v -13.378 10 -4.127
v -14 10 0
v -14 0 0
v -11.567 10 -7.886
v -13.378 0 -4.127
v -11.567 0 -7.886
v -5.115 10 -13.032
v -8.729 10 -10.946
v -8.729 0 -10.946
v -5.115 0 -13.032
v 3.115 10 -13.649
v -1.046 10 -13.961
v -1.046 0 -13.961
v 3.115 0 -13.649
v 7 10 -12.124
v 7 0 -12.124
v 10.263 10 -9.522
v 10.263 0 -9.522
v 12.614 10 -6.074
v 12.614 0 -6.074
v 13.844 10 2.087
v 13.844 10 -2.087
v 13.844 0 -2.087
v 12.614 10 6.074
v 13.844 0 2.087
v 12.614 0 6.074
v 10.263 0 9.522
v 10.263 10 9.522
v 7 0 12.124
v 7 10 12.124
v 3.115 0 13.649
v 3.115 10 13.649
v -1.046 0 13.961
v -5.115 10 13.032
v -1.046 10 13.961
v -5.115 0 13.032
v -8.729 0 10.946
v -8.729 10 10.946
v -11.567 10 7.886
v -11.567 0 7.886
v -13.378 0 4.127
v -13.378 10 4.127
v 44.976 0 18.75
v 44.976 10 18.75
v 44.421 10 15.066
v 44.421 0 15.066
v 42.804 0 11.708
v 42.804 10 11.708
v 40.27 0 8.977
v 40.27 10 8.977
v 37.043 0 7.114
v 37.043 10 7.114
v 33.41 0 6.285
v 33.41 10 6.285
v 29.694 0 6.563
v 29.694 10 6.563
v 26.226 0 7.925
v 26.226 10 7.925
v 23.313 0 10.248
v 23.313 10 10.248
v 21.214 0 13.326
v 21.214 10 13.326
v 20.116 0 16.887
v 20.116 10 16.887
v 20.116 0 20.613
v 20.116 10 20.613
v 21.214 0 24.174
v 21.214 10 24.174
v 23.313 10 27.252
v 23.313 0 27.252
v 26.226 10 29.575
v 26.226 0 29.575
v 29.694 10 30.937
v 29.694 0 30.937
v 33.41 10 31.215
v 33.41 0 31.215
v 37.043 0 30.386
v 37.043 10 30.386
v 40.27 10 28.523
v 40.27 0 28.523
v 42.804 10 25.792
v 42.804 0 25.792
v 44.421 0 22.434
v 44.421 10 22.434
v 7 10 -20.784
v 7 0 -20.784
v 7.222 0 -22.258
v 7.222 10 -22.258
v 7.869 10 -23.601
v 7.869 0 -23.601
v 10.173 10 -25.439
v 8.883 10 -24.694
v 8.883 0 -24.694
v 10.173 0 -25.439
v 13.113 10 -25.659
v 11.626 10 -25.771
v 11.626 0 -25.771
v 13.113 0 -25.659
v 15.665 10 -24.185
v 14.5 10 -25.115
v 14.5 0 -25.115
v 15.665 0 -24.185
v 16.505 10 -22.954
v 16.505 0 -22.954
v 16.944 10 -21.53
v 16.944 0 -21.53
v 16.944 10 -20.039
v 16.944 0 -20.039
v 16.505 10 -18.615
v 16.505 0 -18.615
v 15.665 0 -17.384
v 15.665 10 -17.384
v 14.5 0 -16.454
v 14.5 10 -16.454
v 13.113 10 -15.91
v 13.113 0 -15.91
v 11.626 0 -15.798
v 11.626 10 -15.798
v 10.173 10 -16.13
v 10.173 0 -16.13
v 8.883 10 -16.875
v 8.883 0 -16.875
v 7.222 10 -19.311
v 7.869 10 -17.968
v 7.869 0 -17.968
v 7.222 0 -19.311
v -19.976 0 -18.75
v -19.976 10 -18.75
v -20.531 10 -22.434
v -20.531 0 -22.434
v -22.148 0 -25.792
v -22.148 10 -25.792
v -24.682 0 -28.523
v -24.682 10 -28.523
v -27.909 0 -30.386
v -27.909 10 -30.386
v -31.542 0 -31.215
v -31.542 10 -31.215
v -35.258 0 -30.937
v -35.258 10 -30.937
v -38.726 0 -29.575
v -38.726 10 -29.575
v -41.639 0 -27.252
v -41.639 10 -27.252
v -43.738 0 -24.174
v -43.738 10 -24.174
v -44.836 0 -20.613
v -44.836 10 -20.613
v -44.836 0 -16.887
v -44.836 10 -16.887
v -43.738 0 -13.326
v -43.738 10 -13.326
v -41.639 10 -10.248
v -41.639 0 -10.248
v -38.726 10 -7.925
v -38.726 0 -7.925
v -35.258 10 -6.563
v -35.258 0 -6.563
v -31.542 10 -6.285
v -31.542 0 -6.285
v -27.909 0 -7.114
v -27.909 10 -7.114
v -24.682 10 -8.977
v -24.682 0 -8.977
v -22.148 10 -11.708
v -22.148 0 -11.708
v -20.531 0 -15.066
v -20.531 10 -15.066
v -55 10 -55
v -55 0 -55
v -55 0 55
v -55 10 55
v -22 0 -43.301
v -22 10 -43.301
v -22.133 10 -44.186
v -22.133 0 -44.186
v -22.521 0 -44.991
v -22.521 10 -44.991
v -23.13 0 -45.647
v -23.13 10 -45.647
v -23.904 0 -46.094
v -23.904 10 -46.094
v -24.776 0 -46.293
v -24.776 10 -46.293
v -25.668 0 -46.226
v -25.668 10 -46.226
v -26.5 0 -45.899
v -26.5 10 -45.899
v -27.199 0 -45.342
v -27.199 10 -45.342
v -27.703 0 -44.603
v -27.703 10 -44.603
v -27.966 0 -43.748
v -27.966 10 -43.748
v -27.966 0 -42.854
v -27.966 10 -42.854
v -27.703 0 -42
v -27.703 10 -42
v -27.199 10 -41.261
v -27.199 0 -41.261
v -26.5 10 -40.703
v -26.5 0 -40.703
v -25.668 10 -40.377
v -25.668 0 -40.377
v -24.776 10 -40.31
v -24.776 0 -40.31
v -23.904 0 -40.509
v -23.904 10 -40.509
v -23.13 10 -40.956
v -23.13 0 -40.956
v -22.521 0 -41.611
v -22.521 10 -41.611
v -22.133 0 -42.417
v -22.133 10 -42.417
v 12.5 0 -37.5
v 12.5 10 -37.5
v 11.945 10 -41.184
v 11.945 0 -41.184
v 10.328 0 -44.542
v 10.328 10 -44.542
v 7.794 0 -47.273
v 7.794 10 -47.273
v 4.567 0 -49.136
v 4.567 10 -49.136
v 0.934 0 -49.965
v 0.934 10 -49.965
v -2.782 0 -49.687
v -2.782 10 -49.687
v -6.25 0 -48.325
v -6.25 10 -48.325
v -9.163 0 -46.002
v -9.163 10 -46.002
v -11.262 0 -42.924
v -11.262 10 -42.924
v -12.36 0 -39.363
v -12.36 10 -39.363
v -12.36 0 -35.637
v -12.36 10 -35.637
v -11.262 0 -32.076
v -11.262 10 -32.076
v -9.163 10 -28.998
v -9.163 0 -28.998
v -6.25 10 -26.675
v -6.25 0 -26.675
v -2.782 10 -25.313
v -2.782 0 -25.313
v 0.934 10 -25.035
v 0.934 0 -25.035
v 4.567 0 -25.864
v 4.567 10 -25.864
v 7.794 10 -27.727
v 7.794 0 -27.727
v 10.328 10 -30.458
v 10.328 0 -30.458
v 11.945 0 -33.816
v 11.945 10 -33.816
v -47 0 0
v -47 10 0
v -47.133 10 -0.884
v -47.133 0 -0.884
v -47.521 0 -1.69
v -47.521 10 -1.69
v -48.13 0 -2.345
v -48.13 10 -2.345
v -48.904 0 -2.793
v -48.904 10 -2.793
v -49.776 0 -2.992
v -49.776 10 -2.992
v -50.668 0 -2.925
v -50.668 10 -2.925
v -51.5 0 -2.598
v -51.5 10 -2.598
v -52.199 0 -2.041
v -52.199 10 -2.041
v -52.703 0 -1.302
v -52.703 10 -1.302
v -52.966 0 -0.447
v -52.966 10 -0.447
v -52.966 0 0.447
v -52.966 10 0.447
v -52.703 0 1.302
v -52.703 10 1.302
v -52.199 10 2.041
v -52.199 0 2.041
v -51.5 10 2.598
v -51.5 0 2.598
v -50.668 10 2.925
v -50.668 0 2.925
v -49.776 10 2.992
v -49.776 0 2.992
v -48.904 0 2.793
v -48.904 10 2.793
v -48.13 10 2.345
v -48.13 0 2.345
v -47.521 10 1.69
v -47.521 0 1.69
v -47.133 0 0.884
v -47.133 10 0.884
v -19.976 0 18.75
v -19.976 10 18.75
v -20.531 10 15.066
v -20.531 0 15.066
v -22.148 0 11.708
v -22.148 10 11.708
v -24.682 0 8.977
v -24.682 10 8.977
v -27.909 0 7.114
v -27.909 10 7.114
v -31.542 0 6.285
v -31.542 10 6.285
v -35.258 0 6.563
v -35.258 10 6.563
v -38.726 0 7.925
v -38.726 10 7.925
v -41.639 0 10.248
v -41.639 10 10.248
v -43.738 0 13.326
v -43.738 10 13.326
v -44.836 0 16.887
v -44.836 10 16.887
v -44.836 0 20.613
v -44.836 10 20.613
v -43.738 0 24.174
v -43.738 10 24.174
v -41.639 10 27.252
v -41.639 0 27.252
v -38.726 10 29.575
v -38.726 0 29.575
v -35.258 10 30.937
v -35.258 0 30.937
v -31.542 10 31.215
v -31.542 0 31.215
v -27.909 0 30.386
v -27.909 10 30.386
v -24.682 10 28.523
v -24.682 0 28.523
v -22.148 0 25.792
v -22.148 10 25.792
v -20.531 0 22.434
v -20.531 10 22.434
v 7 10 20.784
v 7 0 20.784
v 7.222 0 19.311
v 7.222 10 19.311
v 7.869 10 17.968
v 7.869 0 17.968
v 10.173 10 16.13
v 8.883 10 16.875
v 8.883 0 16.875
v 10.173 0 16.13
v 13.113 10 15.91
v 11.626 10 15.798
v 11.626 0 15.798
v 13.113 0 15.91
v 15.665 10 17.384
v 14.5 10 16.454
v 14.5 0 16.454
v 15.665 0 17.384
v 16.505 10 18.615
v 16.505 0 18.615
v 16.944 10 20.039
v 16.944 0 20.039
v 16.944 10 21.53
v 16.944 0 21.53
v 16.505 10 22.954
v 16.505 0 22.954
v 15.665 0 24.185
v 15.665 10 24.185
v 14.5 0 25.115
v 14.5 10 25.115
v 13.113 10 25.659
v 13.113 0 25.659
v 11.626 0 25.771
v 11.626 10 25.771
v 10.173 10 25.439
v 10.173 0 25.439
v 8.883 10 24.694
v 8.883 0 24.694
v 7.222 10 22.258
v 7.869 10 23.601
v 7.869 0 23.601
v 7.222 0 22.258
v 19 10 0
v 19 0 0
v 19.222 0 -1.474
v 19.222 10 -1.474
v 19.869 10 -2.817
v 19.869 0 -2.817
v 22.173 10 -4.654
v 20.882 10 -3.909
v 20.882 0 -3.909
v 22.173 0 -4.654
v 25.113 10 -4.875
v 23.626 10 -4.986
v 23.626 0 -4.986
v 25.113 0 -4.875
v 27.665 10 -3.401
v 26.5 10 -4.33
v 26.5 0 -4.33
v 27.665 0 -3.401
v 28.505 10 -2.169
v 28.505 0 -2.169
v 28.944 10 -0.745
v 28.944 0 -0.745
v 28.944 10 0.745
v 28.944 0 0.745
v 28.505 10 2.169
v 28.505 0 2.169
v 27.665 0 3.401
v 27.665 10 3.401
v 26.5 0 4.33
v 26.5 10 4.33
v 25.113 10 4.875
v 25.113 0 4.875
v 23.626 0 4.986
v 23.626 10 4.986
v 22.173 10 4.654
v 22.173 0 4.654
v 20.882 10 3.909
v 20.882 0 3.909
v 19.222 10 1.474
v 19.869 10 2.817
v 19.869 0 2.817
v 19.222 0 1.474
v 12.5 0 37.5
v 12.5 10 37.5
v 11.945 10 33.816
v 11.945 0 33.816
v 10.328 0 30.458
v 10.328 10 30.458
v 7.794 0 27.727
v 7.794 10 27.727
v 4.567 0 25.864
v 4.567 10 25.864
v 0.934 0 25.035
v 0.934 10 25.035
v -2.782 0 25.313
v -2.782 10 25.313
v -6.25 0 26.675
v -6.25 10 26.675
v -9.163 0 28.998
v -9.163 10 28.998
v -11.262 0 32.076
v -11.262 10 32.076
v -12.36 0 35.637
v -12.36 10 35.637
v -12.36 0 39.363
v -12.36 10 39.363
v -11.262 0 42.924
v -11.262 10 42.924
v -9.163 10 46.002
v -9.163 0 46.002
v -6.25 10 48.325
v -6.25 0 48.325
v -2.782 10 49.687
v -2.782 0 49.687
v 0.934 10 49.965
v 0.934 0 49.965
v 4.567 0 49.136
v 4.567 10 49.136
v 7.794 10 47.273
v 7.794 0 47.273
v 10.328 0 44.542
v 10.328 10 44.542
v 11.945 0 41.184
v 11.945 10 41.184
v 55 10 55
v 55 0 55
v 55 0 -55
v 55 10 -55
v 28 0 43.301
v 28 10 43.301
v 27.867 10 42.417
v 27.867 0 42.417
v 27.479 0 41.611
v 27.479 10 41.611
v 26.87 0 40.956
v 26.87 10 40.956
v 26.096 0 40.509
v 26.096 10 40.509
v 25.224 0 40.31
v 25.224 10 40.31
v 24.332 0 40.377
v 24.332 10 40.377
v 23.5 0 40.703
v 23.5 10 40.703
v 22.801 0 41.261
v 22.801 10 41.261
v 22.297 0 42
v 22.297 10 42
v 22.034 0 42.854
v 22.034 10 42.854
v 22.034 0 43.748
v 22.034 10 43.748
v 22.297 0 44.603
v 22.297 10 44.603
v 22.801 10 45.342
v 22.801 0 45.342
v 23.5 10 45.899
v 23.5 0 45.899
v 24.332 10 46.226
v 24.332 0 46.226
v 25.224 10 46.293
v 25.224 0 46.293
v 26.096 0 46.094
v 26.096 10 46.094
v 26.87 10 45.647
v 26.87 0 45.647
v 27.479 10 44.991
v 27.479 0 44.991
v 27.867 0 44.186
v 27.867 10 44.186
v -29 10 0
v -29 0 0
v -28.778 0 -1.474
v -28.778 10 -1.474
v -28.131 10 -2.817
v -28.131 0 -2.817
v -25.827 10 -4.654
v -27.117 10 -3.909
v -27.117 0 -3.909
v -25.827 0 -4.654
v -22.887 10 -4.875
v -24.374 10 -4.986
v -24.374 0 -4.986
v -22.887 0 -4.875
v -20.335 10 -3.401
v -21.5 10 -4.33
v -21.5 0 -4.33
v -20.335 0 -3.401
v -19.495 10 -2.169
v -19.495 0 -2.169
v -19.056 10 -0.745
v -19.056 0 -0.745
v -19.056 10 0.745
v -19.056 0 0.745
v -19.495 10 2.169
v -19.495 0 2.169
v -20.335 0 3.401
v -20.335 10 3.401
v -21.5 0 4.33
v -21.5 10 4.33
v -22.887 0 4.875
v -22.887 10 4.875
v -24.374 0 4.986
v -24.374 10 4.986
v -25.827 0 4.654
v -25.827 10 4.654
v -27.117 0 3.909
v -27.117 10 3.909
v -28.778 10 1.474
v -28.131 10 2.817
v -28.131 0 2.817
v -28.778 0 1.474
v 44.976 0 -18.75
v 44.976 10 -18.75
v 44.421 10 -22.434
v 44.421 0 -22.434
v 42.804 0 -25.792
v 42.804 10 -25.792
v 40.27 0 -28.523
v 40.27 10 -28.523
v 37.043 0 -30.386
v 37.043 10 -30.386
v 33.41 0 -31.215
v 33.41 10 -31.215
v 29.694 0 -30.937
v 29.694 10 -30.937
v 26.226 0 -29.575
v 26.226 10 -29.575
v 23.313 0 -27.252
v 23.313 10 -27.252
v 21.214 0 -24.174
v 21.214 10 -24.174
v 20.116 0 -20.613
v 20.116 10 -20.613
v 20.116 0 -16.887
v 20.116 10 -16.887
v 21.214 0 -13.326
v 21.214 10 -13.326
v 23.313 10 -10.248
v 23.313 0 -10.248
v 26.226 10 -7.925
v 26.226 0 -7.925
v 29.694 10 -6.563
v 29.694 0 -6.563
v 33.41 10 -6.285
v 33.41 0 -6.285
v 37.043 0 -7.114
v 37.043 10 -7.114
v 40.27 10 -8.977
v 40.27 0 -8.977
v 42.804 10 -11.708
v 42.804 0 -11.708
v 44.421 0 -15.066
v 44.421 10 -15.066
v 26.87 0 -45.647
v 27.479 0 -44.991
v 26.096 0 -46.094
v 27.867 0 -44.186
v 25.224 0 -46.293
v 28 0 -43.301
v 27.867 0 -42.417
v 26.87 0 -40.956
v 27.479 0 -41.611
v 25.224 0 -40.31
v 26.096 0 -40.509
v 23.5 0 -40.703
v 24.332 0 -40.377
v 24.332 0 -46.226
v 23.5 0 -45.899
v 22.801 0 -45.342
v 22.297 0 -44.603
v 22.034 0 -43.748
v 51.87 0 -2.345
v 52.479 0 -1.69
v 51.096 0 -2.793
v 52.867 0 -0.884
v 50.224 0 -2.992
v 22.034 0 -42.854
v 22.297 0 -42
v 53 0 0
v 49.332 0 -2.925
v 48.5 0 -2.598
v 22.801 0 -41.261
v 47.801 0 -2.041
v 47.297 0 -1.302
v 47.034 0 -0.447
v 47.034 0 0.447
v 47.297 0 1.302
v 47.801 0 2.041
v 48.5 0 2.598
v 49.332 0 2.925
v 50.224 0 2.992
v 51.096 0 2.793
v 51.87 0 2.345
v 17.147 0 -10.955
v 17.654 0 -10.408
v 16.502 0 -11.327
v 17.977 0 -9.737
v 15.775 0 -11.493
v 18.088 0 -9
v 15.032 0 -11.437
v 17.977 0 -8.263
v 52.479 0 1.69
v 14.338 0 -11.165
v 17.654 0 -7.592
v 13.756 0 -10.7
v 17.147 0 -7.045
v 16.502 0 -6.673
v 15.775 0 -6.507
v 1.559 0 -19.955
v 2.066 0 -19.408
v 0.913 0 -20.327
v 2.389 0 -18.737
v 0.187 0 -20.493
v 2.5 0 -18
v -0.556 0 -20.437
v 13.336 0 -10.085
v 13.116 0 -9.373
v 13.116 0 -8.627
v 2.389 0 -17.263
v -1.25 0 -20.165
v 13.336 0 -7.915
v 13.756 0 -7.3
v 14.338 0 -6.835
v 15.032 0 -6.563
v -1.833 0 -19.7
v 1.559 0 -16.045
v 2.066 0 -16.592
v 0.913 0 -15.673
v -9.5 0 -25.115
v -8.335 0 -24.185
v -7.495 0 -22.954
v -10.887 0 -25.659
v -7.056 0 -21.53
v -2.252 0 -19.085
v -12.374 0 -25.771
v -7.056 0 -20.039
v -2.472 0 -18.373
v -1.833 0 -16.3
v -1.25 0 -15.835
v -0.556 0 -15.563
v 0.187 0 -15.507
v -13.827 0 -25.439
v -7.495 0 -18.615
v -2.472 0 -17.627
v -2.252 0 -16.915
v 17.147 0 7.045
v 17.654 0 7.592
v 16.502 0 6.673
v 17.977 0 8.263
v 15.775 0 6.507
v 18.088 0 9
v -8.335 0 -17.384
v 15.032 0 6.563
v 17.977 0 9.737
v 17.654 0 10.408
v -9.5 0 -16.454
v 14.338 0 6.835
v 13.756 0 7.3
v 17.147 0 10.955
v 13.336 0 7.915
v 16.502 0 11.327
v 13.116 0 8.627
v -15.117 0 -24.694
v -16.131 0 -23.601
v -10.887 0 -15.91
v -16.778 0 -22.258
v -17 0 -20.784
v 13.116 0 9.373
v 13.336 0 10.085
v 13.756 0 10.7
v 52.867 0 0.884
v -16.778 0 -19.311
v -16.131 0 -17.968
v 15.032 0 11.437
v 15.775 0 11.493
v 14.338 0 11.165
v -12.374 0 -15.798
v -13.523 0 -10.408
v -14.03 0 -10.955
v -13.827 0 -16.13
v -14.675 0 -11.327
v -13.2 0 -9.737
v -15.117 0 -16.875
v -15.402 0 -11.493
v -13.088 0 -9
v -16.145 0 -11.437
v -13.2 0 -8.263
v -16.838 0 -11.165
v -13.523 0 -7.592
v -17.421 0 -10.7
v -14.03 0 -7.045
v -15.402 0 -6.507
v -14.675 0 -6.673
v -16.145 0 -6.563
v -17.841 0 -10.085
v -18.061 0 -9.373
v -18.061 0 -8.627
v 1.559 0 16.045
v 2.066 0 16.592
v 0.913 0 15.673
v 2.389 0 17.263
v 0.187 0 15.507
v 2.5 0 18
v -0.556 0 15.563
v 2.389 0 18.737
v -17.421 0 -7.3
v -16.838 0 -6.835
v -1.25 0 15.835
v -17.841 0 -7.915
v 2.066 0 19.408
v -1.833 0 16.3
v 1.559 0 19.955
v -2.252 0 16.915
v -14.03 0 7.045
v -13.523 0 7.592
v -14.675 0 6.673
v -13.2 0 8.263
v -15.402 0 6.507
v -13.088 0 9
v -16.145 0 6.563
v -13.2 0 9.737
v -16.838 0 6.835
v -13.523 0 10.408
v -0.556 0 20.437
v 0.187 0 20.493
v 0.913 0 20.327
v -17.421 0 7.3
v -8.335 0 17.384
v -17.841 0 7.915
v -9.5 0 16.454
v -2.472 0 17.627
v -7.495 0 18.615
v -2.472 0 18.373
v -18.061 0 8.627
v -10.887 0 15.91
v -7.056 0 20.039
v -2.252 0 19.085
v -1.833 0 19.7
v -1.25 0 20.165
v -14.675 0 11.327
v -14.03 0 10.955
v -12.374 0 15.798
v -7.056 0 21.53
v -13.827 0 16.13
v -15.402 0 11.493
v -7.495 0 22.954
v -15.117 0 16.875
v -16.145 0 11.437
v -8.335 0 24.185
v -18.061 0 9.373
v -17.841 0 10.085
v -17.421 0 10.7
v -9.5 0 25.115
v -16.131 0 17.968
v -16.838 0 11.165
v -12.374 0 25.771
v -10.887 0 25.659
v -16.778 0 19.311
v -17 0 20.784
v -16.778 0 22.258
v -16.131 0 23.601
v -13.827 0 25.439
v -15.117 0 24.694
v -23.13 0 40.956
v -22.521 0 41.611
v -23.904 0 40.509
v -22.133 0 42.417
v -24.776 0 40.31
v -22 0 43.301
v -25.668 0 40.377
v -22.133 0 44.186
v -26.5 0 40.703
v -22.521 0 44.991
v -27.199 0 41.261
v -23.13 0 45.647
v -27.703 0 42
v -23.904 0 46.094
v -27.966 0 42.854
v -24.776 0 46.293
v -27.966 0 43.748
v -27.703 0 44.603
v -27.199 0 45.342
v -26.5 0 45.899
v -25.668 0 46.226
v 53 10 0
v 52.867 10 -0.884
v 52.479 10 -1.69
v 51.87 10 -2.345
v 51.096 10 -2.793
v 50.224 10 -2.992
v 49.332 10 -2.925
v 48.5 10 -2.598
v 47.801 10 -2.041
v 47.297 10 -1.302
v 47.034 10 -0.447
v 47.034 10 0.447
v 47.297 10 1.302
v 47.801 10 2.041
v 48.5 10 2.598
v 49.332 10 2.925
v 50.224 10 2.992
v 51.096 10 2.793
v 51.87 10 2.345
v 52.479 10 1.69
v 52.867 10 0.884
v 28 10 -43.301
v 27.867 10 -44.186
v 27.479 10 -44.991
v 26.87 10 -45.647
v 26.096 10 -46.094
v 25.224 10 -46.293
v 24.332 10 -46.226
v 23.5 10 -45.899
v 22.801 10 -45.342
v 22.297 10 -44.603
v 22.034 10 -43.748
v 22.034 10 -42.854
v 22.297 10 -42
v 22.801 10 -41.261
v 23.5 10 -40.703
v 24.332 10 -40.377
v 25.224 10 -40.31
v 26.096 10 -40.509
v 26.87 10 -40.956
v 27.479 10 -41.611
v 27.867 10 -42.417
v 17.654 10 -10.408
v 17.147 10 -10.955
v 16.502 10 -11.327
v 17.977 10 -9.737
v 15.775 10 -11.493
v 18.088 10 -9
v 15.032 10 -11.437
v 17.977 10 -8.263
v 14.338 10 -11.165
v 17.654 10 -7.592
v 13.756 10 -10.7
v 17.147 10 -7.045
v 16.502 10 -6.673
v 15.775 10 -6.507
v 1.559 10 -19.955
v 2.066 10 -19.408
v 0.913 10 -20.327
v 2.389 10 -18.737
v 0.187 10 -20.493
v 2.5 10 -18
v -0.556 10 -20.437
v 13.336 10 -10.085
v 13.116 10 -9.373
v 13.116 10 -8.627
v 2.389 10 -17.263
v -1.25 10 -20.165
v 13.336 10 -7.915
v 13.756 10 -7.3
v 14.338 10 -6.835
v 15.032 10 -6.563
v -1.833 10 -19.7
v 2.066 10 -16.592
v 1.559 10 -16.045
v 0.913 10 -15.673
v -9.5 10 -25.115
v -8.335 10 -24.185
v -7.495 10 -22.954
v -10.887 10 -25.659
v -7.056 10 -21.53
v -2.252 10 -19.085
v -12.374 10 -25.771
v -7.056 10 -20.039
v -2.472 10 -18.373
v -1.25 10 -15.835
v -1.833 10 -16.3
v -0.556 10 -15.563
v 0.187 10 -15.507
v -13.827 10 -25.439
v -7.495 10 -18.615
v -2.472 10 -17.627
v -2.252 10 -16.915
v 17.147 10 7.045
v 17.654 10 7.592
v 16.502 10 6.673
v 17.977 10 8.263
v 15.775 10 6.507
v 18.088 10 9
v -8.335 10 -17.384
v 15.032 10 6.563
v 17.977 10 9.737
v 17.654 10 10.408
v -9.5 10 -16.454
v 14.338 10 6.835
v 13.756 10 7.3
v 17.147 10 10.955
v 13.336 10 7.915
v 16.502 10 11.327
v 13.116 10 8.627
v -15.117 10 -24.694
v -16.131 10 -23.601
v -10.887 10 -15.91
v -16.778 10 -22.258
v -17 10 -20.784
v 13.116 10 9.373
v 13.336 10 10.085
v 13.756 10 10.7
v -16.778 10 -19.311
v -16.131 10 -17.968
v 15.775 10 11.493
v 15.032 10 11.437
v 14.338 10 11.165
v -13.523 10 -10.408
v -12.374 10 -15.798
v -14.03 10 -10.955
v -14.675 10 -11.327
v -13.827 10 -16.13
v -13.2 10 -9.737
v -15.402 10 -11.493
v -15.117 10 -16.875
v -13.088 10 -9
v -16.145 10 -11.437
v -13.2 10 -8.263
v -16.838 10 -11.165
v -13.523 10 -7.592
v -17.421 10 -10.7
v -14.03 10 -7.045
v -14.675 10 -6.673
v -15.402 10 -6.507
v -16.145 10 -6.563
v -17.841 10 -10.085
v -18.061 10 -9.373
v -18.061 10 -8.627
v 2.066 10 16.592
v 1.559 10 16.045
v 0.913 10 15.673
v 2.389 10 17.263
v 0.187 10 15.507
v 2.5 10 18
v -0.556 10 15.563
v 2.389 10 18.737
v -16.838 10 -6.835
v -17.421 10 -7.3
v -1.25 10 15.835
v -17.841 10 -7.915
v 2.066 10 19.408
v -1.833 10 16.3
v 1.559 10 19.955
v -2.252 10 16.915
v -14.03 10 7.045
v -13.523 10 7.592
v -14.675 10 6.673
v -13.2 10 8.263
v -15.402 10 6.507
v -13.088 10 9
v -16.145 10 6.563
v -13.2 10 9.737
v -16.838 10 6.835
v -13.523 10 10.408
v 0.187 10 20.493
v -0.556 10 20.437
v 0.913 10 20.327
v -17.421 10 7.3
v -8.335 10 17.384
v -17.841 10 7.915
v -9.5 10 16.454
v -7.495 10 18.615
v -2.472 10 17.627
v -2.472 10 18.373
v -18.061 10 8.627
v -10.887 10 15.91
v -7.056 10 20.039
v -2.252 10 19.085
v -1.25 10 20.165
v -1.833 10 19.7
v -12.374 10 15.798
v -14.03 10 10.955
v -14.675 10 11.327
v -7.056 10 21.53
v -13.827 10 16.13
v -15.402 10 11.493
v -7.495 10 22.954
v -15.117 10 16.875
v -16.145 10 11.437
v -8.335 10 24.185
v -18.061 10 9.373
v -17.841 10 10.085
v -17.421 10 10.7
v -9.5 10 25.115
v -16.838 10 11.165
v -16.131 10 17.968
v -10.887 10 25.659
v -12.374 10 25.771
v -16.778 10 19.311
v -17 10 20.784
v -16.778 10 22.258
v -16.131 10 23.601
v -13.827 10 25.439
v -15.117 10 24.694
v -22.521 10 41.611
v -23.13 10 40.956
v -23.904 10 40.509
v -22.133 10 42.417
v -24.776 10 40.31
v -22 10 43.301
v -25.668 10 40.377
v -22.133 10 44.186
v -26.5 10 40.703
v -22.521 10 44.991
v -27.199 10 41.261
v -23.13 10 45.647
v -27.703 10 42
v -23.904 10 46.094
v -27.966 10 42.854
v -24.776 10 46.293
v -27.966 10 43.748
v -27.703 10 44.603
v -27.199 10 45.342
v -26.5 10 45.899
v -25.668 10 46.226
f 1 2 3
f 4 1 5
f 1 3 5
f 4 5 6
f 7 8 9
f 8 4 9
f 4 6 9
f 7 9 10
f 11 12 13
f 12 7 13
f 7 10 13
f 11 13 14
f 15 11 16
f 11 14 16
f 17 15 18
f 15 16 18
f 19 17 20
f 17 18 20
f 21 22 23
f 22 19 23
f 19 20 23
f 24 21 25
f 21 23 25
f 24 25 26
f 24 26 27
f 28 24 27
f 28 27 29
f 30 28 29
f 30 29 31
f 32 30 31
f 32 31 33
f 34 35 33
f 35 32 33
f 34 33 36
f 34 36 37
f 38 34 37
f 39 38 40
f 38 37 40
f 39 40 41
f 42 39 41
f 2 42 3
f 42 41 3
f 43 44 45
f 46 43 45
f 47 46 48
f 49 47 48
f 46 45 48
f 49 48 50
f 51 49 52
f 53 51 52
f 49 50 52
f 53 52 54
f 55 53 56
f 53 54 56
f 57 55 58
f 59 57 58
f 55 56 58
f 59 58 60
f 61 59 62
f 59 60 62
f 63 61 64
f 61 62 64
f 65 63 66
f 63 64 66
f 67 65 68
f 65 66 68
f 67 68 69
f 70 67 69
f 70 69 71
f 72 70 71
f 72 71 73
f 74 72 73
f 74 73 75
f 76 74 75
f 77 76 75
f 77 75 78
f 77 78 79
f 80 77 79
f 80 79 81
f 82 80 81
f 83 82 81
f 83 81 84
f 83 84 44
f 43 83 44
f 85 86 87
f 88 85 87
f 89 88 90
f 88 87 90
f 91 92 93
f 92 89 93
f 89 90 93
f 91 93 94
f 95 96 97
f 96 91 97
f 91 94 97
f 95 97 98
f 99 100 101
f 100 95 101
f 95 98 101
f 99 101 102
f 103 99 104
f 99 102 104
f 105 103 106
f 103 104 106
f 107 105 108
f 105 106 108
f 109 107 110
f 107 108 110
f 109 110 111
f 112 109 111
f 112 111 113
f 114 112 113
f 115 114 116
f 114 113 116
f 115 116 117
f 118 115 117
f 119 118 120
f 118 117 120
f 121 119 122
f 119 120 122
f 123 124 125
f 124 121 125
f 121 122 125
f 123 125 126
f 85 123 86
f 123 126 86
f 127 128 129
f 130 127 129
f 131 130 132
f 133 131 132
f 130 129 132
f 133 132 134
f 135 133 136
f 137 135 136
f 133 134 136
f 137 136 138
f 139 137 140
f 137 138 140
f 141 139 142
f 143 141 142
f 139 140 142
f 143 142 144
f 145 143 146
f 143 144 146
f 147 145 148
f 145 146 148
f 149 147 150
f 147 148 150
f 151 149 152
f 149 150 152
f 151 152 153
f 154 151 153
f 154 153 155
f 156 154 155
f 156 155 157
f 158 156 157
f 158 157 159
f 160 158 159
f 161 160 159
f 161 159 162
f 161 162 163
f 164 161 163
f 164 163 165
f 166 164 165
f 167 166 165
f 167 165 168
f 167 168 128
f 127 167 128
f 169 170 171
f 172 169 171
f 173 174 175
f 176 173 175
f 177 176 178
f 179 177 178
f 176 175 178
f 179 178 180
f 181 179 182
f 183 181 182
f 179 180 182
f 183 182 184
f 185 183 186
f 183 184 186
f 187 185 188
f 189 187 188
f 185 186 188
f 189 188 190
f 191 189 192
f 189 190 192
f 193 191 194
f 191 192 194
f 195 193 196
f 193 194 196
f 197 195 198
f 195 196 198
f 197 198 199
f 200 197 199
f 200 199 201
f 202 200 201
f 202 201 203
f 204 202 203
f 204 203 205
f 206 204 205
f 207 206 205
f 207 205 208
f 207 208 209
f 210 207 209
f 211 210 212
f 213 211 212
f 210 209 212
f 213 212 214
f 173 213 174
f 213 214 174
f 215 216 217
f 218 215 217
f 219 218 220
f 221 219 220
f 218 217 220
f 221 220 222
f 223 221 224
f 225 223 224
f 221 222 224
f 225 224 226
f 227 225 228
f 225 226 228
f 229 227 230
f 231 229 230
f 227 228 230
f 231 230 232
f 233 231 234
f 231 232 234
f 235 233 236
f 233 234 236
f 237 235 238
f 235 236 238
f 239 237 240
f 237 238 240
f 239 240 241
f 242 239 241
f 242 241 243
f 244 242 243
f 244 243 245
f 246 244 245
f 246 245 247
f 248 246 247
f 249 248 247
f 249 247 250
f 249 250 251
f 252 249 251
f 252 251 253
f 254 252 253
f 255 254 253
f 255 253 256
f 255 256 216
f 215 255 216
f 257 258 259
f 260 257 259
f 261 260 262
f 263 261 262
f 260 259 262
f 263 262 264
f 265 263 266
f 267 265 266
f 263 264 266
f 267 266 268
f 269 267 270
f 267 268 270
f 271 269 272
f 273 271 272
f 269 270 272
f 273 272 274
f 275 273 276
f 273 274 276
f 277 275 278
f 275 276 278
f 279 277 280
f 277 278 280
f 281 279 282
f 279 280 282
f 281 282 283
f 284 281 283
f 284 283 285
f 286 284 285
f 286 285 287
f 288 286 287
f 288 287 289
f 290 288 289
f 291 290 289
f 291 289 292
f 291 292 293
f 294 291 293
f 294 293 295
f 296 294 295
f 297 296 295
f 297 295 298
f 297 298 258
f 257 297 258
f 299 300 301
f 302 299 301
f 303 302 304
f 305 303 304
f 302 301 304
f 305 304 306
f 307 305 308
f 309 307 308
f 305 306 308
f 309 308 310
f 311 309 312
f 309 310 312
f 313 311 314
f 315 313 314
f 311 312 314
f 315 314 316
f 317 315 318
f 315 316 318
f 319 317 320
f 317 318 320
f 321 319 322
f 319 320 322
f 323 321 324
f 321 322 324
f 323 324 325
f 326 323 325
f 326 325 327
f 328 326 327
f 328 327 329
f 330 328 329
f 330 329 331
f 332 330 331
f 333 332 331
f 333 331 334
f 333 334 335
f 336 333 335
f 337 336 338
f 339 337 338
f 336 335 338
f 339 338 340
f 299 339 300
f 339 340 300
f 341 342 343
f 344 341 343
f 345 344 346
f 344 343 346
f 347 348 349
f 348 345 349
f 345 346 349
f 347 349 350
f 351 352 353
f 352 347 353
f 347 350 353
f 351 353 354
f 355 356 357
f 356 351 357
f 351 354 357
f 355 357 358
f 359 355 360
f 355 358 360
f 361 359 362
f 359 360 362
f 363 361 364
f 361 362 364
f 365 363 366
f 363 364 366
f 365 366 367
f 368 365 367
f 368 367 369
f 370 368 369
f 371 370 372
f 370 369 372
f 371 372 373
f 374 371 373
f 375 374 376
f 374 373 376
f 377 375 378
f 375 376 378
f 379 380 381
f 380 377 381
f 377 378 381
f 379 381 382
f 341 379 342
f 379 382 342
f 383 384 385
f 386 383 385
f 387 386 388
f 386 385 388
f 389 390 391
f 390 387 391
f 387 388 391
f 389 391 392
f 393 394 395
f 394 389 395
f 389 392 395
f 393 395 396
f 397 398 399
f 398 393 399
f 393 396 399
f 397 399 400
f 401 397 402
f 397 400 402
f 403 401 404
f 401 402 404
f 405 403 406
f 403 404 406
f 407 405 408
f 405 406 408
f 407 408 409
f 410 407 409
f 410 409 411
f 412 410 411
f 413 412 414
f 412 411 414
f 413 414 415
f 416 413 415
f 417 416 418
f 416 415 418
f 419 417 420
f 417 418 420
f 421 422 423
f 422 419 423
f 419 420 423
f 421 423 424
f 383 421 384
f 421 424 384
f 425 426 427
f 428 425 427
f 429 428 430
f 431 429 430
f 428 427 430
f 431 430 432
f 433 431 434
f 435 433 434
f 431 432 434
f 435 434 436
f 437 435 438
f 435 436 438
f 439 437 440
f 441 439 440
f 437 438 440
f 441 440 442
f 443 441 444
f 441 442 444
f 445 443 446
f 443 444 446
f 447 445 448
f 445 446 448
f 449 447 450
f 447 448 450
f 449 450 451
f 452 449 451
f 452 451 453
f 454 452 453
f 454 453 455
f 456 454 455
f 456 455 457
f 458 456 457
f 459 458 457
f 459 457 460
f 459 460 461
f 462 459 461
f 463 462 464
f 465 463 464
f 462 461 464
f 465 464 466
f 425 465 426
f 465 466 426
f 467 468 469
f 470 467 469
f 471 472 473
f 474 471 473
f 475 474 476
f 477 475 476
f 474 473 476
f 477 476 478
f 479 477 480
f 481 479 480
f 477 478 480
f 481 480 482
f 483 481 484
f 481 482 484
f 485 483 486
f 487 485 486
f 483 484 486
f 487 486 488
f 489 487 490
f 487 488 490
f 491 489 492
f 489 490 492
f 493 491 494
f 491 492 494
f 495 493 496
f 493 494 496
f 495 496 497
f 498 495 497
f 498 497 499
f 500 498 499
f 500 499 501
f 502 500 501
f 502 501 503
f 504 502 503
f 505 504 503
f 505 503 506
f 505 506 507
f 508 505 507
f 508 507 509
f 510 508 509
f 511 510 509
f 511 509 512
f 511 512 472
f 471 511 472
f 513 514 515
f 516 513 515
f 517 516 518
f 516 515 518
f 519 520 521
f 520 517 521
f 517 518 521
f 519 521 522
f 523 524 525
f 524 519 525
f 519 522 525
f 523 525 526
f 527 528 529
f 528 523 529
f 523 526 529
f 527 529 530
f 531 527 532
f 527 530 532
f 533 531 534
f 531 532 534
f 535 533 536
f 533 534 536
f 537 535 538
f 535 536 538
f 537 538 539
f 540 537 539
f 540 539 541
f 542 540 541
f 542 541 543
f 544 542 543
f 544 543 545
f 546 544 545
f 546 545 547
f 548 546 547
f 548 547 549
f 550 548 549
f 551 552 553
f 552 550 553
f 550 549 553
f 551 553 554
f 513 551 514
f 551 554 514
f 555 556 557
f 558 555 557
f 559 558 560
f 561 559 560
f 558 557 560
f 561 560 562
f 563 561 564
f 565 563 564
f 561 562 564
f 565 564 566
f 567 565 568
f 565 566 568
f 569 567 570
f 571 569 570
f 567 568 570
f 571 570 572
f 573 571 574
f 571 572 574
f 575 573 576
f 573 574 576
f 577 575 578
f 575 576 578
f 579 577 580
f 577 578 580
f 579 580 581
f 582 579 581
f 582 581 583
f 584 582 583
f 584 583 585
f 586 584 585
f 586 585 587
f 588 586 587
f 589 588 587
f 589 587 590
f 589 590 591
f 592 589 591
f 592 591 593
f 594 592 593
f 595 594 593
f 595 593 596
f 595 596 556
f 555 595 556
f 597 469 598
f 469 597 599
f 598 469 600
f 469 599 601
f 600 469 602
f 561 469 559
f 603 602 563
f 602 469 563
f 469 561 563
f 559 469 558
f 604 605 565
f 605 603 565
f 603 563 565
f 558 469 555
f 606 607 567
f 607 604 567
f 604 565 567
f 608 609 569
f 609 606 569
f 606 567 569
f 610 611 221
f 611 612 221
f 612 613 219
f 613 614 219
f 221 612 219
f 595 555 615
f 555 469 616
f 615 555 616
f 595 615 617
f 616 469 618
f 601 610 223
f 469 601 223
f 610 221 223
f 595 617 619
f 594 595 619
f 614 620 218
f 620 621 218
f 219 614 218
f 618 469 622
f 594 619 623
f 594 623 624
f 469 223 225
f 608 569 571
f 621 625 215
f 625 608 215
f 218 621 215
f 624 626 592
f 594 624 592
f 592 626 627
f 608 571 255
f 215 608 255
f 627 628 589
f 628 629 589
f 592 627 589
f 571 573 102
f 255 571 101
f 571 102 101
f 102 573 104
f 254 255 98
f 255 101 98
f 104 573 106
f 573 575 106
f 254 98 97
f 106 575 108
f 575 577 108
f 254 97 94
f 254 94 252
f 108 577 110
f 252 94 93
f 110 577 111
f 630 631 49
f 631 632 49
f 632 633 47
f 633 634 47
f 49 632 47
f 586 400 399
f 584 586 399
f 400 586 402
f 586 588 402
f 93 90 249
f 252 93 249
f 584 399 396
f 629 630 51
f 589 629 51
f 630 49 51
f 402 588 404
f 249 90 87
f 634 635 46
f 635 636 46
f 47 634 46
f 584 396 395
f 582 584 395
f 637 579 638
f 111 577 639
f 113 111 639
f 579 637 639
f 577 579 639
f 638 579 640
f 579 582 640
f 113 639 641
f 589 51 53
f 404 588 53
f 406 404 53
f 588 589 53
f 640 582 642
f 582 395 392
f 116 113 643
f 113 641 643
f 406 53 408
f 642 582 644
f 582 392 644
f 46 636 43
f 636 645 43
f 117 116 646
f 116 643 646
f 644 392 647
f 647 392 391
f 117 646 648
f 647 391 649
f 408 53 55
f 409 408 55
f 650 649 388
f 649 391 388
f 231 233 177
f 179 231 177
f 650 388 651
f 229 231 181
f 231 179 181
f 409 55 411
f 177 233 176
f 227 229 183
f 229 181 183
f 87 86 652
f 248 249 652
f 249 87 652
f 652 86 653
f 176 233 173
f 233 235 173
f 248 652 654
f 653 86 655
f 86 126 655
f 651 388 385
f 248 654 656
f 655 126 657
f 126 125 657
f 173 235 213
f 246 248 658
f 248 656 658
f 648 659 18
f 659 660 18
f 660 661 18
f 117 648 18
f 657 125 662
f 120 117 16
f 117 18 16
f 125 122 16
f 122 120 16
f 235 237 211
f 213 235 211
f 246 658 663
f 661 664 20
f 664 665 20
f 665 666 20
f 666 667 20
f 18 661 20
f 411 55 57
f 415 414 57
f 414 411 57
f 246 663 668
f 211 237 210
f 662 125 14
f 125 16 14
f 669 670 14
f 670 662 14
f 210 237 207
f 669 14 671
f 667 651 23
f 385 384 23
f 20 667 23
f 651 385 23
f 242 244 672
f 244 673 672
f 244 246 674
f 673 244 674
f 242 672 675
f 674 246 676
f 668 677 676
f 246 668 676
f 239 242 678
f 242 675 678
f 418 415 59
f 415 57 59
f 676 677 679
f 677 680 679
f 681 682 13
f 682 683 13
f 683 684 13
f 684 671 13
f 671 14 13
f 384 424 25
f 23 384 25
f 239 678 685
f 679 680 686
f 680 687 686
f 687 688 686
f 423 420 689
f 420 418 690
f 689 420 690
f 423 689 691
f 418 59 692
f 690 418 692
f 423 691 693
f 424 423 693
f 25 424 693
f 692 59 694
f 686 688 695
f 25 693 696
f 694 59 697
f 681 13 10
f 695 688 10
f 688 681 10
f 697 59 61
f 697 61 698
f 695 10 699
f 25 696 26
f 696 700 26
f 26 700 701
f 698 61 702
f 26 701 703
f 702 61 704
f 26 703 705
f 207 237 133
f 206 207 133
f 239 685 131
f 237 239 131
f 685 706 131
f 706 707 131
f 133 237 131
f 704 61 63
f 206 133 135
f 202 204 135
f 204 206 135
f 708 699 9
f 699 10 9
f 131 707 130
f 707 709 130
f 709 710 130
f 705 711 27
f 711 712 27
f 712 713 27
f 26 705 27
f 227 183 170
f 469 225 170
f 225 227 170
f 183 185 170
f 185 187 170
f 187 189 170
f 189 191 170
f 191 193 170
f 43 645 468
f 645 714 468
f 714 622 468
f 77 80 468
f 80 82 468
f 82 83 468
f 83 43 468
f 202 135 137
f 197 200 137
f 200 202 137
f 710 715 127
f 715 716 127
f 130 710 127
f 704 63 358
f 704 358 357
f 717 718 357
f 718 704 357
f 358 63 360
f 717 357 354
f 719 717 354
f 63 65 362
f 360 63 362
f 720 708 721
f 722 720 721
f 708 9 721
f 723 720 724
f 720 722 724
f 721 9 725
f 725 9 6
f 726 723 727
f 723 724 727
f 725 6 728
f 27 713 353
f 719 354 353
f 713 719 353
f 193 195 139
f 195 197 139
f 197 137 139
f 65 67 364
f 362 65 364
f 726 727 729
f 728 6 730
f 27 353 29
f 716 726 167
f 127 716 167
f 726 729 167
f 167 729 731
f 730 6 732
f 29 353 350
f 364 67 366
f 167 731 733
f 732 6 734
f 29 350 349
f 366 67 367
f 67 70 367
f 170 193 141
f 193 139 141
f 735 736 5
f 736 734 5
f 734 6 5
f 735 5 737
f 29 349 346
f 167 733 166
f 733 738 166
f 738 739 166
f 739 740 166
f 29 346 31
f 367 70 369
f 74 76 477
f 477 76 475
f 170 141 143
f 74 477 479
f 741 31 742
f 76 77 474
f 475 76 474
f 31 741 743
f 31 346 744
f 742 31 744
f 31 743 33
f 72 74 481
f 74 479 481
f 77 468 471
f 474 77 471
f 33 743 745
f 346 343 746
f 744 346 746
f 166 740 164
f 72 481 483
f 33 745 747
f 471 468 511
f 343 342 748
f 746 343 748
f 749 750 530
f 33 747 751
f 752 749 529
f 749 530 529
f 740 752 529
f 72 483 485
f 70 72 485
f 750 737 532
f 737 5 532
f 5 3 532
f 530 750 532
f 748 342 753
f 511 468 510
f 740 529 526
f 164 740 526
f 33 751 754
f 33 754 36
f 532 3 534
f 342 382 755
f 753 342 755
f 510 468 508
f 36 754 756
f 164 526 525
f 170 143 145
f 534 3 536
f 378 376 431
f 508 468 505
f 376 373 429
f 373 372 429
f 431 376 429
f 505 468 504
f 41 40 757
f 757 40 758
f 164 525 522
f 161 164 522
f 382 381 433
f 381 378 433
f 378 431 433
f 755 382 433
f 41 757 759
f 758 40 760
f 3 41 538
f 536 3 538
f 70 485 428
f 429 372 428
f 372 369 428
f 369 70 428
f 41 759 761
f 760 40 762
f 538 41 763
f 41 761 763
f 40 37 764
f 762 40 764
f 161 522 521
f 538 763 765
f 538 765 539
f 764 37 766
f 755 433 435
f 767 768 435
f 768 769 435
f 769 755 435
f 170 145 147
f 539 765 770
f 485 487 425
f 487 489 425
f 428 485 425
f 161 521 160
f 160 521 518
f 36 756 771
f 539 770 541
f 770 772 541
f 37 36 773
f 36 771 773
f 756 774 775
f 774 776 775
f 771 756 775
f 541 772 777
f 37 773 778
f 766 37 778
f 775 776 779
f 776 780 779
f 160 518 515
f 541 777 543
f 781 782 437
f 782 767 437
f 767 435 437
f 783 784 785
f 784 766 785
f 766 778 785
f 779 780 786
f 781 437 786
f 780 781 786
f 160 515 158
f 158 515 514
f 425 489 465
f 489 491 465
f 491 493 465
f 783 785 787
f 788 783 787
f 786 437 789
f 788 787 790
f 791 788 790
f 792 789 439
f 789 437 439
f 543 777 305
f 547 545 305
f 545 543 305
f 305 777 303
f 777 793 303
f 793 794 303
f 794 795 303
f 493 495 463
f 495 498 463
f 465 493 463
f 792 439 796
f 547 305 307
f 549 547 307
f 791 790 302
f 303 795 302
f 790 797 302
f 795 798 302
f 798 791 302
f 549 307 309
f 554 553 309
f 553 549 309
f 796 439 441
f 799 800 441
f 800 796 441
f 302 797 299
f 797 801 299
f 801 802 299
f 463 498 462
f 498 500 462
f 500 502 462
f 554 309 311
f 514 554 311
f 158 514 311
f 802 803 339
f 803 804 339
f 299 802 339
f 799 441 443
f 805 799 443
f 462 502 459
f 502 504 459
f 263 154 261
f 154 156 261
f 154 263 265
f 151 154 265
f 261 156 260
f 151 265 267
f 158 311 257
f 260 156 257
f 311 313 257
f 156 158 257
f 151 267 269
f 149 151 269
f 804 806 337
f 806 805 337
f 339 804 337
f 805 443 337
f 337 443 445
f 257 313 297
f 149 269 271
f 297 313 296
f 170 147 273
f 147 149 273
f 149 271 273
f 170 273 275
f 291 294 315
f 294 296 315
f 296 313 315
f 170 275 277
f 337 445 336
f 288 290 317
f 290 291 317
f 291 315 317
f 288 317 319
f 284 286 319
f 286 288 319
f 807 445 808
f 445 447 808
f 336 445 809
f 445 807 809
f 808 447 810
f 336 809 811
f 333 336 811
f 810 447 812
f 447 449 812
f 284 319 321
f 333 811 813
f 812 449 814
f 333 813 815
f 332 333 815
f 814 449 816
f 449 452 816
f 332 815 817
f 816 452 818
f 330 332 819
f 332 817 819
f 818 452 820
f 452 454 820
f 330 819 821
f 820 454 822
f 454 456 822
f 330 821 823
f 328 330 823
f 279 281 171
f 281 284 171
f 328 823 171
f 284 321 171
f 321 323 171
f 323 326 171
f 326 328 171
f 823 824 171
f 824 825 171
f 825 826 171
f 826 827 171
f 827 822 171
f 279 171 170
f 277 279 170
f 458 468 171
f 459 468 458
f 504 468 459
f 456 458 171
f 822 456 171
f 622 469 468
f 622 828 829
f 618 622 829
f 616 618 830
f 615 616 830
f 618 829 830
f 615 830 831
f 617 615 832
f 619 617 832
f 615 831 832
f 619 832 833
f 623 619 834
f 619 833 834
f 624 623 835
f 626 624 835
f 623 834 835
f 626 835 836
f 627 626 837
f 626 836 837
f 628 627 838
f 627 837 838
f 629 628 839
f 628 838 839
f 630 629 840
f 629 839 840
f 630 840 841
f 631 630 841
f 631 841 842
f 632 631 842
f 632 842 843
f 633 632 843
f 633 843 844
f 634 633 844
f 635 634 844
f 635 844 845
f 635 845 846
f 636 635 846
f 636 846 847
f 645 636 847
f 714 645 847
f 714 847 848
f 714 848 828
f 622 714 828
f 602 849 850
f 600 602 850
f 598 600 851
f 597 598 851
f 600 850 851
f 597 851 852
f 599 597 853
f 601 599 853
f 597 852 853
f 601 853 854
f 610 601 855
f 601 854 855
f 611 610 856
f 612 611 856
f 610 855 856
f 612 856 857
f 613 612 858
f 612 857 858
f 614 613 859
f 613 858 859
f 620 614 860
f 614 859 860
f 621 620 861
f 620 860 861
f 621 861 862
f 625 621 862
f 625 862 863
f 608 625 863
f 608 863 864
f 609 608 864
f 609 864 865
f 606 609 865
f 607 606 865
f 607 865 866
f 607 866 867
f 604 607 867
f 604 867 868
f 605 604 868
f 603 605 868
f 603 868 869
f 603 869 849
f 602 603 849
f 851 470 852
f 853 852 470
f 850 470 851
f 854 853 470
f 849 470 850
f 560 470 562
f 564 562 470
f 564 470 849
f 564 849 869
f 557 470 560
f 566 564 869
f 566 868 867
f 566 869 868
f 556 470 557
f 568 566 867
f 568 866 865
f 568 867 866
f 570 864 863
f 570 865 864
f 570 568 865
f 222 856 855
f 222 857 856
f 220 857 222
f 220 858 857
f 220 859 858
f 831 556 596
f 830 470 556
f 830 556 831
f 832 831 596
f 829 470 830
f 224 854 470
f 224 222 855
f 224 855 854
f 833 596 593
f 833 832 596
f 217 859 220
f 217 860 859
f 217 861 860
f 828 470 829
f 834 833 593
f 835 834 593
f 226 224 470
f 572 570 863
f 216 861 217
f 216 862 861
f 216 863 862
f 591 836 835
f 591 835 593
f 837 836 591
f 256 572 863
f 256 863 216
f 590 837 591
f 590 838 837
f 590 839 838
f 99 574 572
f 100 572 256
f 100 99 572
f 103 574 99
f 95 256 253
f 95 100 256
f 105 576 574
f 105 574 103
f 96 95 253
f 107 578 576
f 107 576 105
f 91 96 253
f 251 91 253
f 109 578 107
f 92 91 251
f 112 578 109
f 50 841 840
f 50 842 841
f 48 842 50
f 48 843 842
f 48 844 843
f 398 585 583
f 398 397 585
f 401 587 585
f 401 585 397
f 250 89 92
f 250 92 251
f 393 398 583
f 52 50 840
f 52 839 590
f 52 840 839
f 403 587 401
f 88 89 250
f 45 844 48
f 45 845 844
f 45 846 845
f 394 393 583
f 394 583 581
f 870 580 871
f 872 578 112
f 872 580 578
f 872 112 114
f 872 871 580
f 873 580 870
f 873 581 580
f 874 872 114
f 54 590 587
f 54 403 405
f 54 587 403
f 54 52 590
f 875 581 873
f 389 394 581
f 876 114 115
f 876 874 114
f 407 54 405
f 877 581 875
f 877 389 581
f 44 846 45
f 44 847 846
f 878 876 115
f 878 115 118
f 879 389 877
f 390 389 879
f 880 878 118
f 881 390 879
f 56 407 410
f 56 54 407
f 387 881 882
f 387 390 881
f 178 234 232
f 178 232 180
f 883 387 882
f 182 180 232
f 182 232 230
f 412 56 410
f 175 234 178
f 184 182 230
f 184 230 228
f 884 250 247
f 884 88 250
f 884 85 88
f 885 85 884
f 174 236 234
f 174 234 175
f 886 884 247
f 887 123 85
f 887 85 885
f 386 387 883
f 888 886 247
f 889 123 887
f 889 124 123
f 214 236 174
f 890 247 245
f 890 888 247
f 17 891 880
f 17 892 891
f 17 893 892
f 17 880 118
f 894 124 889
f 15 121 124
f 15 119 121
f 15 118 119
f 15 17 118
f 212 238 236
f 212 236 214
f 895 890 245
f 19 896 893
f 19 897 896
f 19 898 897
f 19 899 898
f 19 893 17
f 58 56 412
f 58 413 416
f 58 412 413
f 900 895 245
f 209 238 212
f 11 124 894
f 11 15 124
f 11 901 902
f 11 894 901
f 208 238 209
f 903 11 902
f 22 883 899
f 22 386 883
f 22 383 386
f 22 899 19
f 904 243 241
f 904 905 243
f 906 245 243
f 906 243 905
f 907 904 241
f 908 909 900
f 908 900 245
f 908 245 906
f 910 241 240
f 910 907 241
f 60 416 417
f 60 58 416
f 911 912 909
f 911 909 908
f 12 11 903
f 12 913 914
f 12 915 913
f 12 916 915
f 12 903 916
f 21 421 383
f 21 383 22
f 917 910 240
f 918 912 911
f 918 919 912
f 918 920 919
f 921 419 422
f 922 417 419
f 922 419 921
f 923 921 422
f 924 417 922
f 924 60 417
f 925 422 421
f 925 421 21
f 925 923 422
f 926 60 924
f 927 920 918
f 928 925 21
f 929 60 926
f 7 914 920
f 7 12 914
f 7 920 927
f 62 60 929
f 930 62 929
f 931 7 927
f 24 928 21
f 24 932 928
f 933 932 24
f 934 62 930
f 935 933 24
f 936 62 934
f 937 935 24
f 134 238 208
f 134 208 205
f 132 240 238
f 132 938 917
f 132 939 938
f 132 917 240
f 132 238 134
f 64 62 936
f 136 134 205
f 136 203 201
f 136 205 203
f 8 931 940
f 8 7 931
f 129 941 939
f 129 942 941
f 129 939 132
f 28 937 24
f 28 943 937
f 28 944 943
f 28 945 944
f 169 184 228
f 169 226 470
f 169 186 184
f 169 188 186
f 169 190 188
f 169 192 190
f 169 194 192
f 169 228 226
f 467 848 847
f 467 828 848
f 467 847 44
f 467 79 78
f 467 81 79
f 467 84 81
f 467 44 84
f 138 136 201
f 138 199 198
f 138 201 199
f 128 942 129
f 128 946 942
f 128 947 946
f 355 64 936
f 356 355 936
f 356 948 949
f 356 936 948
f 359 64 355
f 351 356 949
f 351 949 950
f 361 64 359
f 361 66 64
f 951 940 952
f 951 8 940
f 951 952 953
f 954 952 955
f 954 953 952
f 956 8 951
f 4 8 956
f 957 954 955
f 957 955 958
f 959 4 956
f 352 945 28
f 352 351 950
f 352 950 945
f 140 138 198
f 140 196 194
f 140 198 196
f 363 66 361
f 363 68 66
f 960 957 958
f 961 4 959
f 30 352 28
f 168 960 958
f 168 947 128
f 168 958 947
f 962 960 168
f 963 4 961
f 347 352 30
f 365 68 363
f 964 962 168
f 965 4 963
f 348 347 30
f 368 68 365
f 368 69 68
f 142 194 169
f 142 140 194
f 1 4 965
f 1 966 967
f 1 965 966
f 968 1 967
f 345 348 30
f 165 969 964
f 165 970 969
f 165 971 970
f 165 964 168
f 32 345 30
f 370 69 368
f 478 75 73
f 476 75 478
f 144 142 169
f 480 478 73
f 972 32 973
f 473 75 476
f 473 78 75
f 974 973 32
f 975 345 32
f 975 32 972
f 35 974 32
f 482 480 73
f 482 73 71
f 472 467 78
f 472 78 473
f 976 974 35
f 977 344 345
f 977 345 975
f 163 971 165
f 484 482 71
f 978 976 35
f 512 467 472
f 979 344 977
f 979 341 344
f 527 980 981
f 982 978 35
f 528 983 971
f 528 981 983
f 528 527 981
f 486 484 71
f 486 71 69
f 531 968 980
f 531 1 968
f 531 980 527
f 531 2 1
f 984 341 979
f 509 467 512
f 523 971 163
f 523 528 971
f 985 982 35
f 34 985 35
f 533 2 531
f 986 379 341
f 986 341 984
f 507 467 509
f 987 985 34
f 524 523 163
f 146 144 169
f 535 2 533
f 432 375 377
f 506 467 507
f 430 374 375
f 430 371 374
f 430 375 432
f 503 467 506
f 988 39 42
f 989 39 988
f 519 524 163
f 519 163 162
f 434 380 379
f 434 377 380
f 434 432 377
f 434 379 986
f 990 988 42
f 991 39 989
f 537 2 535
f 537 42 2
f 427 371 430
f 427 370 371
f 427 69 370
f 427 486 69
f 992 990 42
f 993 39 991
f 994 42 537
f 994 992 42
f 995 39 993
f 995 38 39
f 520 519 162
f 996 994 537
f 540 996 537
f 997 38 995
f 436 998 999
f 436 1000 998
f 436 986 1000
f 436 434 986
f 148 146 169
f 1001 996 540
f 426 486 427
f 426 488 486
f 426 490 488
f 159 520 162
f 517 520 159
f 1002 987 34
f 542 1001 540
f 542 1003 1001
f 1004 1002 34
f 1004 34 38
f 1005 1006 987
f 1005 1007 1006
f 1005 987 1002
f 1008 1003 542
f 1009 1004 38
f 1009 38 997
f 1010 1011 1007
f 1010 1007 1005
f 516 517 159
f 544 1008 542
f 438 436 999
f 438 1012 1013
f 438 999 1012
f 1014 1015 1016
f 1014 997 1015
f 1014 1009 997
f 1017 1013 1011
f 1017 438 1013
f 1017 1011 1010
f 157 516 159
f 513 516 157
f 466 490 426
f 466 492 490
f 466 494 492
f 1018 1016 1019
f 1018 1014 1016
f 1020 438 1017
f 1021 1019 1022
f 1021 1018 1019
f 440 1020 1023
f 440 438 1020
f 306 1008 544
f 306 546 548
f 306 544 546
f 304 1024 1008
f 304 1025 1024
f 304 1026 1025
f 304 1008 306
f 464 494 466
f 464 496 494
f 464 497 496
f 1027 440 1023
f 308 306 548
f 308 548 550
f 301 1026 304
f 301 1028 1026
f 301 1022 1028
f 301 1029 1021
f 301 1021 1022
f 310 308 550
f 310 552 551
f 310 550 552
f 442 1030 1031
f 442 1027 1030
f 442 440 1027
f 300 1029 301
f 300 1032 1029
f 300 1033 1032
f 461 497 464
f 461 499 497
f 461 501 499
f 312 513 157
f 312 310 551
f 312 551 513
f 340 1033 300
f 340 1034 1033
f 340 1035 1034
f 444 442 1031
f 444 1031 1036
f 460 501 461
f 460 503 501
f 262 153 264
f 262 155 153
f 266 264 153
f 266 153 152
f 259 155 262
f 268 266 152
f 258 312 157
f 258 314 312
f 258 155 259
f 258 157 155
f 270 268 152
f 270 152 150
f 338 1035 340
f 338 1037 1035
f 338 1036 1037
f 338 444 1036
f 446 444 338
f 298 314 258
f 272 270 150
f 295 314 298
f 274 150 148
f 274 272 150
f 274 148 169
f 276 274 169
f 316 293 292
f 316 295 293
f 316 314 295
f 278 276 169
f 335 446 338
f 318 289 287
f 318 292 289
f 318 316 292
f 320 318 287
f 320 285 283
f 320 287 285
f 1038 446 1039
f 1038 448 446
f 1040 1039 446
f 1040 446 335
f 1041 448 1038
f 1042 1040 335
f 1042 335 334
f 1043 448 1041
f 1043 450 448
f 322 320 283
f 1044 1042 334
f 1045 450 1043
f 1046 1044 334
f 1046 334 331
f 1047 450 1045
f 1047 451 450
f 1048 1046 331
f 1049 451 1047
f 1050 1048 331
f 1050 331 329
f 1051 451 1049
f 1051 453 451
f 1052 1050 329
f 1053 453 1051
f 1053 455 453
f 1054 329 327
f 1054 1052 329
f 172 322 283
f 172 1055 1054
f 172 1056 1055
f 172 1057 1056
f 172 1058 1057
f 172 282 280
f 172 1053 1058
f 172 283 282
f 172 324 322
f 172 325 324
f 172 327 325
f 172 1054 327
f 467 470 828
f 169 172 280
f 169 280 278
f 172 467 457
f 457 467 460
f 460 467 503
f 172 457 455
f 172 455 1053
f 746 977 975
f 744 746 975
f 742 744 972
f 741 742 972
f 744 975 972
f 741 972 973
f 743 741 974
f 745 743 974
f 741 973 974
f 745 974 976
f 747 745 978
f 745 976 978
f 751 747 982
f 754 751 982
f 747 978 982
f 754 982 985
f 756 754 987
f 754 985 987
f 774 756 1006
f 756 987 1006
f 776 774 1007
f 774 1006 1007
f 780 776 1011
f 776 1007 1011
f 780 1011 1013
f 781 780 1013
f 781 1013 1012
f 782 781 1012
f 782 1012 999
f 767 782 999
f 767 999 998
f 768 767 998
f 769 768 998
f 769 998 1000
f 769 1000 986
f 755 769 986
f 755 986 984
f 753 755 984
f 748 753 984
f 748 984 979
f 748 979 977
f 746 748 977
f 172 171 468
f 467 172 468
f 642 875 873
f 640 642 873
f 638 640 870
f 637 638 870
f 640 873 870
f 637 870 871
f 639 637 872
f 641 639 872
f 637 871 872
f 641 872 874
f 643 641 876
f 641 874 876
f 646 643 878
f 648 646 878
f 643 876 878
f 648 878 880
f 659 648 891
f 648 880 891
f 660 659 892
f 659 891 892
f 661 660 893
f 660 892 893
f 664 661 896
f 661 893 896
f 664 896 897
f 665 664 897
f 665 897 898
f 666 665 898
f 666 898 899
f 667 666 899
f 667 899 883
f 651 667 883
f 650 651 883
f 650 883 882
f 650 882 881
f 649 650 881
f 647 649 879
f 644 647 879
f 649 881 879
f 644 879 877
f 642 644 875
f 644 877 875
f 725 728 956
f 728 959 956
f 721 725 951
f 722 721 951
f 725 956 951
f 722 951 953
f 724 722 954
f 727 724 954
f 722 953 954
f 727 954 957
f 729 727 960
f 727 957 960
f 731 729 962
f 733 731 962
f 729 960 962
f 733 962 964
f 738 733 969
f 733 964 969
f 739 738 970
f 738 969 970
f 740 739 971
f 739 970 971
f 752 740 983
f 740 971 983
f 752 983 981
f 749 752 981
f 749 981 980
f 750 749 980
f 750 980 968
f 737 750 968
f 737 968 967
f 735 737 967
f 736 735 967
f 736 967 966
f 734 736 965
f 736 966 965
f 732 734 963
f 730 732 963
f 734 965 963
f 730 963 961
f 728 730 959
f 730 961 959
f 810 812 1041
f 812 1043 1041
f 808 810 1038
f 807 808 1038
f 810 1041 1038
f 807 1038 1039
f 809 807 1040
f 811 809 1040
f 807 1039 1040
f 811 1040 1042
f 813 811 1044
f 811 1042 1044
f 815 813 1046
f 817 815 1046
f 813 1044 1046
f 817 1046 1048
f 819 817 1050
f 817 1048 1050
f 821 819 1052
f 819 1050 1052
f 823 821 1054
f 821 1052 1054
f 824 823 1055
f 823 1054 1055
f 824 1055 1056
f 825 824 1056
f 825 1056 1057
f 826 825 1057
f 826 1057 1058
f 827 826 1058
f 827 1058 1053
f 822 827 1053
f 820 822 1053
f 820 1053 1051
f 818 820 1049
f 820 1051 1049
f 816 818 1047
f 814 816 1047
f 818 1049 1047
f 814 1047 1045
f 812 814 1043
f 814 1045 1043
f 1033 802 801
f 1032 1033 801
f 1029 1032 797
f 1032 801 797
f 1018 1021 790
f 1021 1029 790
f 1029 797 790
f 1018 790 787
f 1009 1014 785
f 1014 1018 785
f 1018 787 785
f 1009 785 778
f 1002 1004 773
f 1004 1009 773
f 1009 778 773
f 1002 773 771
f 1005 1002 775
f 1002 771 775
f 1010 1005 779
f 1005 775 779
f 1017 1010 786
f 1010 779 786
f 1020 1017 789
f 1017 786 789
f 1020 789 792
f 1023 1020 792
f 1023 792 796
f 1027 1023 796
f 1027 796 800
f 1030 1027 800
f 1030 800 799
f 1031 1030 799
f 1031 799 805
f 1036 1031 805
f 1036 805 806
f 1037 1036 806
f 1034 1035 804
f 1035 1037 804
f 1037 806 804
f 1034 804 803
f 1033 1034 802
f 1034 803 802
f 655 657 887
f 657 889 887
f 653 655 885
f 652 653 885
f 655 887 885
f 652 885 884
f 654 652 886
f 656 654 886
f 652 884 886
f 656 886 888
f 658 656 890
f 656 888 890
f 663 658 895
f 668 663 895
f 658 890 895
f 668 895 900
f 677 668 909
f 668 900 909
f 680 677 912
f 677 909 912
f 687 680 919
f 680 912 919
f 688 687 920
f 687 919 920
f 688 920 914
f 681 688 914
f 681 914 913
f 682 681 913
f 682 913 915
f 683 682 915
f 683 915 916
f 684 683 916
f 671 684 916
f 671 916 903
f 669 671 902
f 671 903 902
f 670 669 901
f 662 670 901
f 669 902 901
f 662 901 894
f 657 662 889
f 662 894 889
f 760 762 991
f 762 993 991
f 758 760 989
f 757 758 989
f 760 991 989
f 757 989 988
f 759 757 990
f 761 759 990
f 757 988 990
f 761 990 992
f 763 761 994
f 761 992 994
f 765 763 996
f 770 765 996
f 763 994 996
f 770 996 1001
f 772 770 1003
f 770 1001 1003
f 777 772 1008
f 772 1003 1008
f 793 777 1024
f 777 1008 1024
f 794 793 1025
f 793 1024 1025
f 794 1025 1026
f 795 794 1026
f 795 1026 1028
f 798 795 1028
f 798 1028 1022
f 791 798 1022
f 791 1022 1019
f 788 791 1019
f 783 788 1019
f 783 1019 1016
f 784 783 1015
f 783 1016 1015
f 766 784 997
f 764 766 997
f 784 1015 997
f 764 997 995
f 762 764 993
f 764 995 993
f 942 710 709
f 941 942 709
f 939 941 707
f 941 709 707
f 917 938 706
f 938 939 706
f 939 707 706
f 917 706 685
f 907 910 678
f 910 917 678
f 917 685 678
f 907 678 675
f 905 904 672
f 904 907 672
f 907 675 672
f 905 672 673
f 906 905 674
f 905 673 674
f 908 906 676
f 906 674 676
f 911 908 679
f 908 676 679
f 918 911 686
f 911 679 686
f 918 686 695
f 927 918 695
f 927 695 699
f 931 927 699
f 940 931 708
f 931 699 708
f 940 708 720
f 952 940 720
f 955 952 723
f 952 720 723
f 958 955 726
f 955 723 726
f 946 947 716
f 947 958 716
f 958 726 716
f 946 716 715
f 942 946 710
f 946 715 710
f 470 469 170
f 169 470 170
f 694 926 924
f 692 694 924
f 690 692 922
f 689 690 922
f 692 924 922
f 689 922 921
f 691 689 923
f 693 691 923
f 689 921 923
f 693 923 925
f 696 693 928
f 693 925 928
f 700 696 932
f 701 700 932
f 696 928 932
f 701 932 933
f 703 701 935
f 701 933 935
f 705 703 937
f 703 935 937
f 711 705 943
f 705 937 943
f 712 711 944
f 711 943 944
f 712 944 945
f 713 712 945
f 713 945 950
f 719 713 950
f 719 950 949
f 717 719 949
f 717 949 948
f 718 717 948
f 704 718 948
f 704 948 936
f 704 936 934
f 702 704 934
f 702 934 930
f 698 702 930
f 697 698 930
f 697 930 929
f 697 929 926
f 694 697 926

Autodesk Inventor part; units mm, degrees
ref_plane "YZ Plane" through (0, 0, 0) normal (1, 0, 0) x (0, 1, 0)
ref_plane "XZ Plane" through (0, 0, 0) normal (0, 1, 0) x (-1, 0, 0)
ref_plane "XY Plane" through (0, 0, 0) normal (0, 0, 1) x (1, 0, 0)
sketch "Эскиз1" plane through (0, 0, 0) normal (0, 1, 0) x (-1, 0, 0)
  circle A0 centre (0, 0) radius 14
  circle A1 centre (0, 0) radius 24 construction
  circle A2 centre (0, 0) radius 55
  circle A3 centre (23.9999, 0) radius 5
  circle A4 centre (12, 20.7845) radius 5
  circle A5 centre (-12, 20.7845) radius 5
  circle A6 centre (-23.9999, 0) radius 5
  circle A7 centre (-12, -20.7845) radius 5
  circle A8 centre (12, -20.7845) radius 5
  line L0 (-54.9999, -55) -> (54.9999, -55)
  line L1 (54.9999, -55) -> (54.9999, 55)
  line L2 (54.9999, 55) -> (-54.9999, 55)
  line L3 (-54.9999, 55) -> (-54.9999, -55)
  line L4 (-54.9999, -55) -> (54.9999, 55) construction
  line L5 (54.9999, -55) -> (-54.9999, 55) construction
  dimension "d0" = 28
  dimension "d1" = 48
  dimension "d2" = 110
  dimension "d3" = 10
  dimension "d6" = 360
extrude "Выдавливание1" add sketch "Эскиз1" along normal blind 10
sketch "Эскиз2" plane through (0, 10, 0) normal (0, 1, 0) x (1, 0, 0)
  circle A0 centre (0, 0) radius 14 projected
  circle A1 centre (0, 37.5) radius 12.5
  circle A2 centre (-32.476, 18.75) radius 12.5
  circle A3 centre (-32.476, -18.75) radius 12.5
  circle A4 centre (0, -37.5) radius 12.5
  circle A5 centre (32.476, -18.75) radius 12.5
  circle A6 centre (32.476, 18.75) radius 12.5
  dimension "d10" = 25
  dimension "d13" = 360
  dimension "d19" = 37.5
extrude "Выдавливание2" cut sketch "Эскиз2" against normal blind 10 contours A1 | A2 | A3 | A4 | A5 | A6
sketch "Эскиз3" plane through (0, 10, 0) normal (0, 1, 0) x (1, 0, 0)
  circle A0 centre (0, 0) radius 55 projected
  circle A1 centre (0, 0) radius 14 projected
  circle A2 centre (0, 18) radius 2.5
  circle A3 centre (-15.5885, 9) radius 2.5
  circle A4 centre (-15.5885, -9) radius 2.5
  circle A5 centre (0, -18) radius 2.5
  circle A6 centre (15.5885, -9) radius 2.5
  circle A7 centre (15.5885, 9) radius 2.5
  point P0 (44.976, 18.75)
  point P1 (12.5, 37.5)
  dimension "d20" = 5
  dimension "d22" = 18
  dimension "d25" = 360
extrude "Выдавливание3" cut sketch "Эскиз3" against normal blind 10 contours A2 | A3 | A4 | A5 | A6 | A7
sketch "Эскиз4" plane through (0, 10, 0) normal (0, 1, 0) x (1, 0, 0)
  circle A0 centre (0, 0) radius 14 projected
  circle A1 centre (50, 0) radius 3
  circle A2 centre (25, 43.3013) radius 3
  circle A3 centre (-25, 43.3013) radius 3
  circle A4 centre (-50, 0) radius 3
  circle A5 centre (-25, -43.3013) radius 3
  circle A6 centre (25, -43.3013) radius 3
  dimension "d29" = 6
  dimension "d30" = 50
  dimension "d33" = 360
extrude "Выдавливание4" cut sketch "Эскиз4" against normal blind 10 contours A1 | A2 | A3 | A4 | A5 | A6
properties part number "Статор цевков"
